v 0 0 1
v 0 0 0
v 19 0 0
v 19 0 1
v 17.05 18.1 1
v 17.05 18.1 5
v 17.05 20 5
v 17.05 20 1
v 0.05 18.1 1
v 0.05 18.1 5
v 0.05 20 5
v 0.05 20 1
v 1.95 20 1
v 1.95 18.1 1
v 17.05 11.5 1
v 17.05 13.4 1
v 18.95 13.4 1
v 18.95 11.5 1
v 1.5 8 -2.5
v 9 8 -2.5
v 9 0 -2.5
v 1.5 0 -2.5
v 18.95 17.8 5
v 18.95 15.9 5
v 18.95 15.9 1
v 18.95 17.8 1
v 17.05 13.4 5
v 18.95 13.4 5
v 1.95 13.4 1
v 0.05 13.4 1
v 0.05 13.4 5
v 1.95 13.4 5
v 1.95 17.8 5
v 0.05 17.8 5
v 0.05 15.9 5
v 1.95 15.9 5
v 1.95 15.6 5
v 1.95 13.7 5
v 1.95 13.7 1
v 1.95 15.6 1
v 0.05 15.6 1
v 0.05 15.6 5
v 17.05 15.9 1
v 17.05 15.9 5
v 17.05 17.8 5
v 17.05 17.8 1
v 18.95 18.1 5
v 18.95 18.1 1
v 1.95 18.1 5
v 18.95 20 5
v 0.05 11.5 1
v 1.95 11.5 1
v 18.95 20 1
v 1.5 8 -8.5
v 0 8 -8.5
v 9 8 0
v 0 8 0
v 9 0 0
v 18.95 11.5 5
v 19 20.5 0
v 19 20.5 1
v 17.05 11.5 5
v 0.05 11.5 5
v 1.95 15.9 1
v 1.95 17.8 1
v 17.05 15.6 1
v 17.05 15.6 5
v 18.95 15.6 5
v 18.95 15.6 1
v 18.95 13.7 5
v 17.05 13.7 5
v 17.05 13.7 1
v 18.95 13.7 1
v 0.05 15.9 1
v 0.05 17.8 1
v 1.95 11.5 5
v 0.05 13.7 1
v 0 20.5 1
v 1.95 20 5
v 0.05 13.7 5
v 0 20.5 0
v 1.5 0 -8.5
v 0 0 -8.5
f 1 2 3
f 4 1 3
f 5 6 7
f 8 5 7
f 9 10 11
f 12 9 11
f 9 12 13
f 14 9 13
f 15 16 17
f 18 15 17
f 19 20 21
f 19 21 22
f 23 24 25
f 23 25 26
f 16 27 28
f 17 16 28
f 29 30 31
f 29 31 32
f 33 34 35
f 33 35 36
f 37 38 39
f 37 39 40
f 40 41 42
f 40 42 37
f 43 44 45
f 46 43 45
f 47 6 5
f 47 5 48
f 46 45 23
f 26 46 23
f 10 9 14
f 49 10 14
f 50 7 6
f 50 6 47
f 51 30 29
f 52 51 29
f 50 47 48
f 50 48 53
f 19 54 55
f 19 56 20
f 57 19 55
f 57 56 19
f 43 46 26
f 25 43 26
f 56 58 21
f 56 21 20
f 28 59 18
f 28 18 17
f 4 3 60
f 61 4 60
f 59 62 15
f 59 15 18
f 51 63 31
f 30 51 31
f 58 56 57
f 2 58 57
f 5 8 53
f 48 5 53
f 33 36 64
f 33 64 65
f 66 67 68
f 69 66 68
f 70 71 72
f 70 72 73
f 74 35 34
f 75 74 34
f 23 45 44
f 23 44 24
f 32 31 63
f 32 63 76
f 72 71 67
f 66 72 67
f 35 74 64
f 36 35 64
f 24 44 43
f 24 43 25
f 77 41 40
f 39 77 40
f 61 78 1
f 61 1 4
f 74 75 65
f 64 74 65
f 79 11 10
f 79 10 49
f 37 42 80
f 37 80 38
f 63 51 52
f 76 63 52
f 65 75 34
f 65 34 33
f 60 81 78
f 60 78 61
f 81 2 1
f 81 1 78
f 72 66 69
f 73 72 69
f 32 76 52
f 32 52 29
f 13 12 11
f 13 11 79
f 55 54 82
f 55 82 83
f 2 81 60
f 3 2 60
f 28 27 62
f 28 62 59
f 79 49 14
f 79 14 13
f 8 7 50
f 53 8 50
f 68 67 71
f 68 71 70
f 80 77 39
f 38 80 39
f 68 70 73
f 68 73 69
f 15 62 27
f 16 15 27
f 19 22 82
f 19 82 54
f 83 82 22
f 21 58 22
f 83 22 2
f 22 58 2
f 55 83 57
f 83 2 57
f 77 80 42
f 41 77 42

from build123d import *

# Parameters (mm, degrees)
SKETCH_1_W        = 19
SKETCH_1_H        = 20.5
EXTRUDE_1_DEPTH   = 1
SKETCH_2_W        = 1.9
SKETCH_2_H        = 1.9
EXTRUDE_2_DEPTH   = 4
EXTRUDE_2_2_DEPTH = 4
EXTRUDE_2_3_DEPTH = 4
EXTRUDE_2_4_DEPTH = 4
EXTRUDE_2_5_DEPTH = 4
EXTRUDE_2_6_DEPTH = 4
EXTRUDE_2_7_DEPTH = 4
EXTRUDE_2_8_DEPTH = 4
SKETCH_3_W        = 9
SKETCH_3_H        = 8
EXTRUDE_3_DEPTH   = 2.5
SKETCH_4_W        = 1.5
SKETCH_4_H        = 8
EXTRUDE_4_DEPTH   = 6


with BuildPart() as part:
    # ｽｹｯﾁ1 → ﾎﾞｽ - 押し出し1 (new body)
    with BuildSketch(Plane.XY):
        with Locations((9.5, 10.25)):
            Rectangle(SKETCH_1_W, SKETCH_1_H)
    extrude(amount=EXTRUDE_1_DEPTH)


with BuildPart() as body_2:
    # ｽｹｯﾁ2 → ﾎﾞｽ - 押し出し2 (new body)
    with BuildSketch(Plane.XY.offset(1)):
        with Locations((1, 19.05)):
            Rectangle(SKETCH_2_W, SKETCH_2_H)
    extrude(amount=EXTRUDE_2_DEPTH)


with BuildPart() as body_3:
    # ｽｹｯﾁ2 → Extrude 2 2 (new body)
    with BuildSketch(Plane.XY.offset(1)):
        with Locations((18, 19.05)):
            Rectangle(SKETCH_2_W, SKETCH_2_H)
    extrude(amount=EXTRUDE_2_2_DEPTH)


with BuildPart() as body_4:
    # ｽｹｯﾁ2 → Extrude 2 3 (new body)
    with BuildSketch(Plane.XY.offset(1)):
        with Locations((1, 16.85)):
            Rectangle(SKETCH_2_W, SKETCH_2_H)
    extrude(amount=EXTRUDE_2_3_DEPTH)


with BuildPart() as body_5:
    # ｽｹｯﾁ2 → Extrude 2 4 (new body)
    with BuildSketch(Plane.XY.offset(1)):
        with Locations((18, 16.85)):
            Rectangle(SKETCH_2_W, SKETCH_2_H)
    extrude(amount=EXTRUDE_2_4_DEPTH)


with BuildPart() as body_6:
    # ｽｹｯﾁ2 → Extrude 2 5 (new body)
    with BuildSketch(Plane.XY.offset(1)):
        with Locations((1, 14.65)):
            Rectangle(SKETCH_2_W, SKETCH_2_H)
    extrude(amount=EXTRUDE_2_5_DEPTH)


with BuildPart() as body_7:
    # ｽｹｯﾁ2 → Extrude 2 6 (new body)
    with BuildSketch(Plane.XY.offset(1)):
        with Locations((18, 14.65)):
            Rectangle(SKETCH_2_W, SKETCH_2_H)
    extrude(amount=EXTRUDE_2_6_DEPTH)


with BuildPart() as body_8:
    # ｽｹｯﾁ2 → Extrude 2 7 (new body)
    with BuildSketch(Plane.XY.offset(1)):
        with Locations((1, 12.45)):
            Rectangle(SKETCH_2_W, SKETCH_2_H)
    extrude(amount=EXTRUDE_2_7_DEPTH)


with BuildPart() as body_9:
    # ｽｹｯﾁ2 → Extrude 2 8 (new body)
    with BuildSketch(Plane.XY.offset(1)):
        with Locations((18, 12.45)):
            Rectangle(SKETCH_2_W, SKETCH_2_H)
    extrude(amount=EXTRUDE_2_8_DEPTH)


with BuildPart() as body_10:
    # ｽｹｯﾁ3 → ﾎﾞｽ - 押し出し3 (new body)
    with BuildSketch(Plane(origin=(0, 0, 0), x_dir=(-1, 0, 0), z_dir=(0, 0, -1))):
        with Locations((-4.5, 4)):
            Rectangle(SKETCH_3_W, SKETCH_3_H)
    extrude(amount=EXTRUDE_3_DEPTH)

    # ｽｹｯﾁ4 → ﾎﾞｽ - 押し出し4 (add)
    with BuildSketch(Plane(origin=(0, 0, -2.5), x_dir=(-1, 0, 0), z_dir=(0, 0, -1))):
        with Locations((-0.75, 4)):
            Rectangle(SKETCH_4_W, SKETCH_4_H)
    extrude(amount=EXTRUDE_4_DEPTH)


solid = Compound([part.part, body_2.part, body_3.part, body_4.part, body_5.part, body_6.part, body_7.part, body_8.part, body_9.part, body_10.part])
